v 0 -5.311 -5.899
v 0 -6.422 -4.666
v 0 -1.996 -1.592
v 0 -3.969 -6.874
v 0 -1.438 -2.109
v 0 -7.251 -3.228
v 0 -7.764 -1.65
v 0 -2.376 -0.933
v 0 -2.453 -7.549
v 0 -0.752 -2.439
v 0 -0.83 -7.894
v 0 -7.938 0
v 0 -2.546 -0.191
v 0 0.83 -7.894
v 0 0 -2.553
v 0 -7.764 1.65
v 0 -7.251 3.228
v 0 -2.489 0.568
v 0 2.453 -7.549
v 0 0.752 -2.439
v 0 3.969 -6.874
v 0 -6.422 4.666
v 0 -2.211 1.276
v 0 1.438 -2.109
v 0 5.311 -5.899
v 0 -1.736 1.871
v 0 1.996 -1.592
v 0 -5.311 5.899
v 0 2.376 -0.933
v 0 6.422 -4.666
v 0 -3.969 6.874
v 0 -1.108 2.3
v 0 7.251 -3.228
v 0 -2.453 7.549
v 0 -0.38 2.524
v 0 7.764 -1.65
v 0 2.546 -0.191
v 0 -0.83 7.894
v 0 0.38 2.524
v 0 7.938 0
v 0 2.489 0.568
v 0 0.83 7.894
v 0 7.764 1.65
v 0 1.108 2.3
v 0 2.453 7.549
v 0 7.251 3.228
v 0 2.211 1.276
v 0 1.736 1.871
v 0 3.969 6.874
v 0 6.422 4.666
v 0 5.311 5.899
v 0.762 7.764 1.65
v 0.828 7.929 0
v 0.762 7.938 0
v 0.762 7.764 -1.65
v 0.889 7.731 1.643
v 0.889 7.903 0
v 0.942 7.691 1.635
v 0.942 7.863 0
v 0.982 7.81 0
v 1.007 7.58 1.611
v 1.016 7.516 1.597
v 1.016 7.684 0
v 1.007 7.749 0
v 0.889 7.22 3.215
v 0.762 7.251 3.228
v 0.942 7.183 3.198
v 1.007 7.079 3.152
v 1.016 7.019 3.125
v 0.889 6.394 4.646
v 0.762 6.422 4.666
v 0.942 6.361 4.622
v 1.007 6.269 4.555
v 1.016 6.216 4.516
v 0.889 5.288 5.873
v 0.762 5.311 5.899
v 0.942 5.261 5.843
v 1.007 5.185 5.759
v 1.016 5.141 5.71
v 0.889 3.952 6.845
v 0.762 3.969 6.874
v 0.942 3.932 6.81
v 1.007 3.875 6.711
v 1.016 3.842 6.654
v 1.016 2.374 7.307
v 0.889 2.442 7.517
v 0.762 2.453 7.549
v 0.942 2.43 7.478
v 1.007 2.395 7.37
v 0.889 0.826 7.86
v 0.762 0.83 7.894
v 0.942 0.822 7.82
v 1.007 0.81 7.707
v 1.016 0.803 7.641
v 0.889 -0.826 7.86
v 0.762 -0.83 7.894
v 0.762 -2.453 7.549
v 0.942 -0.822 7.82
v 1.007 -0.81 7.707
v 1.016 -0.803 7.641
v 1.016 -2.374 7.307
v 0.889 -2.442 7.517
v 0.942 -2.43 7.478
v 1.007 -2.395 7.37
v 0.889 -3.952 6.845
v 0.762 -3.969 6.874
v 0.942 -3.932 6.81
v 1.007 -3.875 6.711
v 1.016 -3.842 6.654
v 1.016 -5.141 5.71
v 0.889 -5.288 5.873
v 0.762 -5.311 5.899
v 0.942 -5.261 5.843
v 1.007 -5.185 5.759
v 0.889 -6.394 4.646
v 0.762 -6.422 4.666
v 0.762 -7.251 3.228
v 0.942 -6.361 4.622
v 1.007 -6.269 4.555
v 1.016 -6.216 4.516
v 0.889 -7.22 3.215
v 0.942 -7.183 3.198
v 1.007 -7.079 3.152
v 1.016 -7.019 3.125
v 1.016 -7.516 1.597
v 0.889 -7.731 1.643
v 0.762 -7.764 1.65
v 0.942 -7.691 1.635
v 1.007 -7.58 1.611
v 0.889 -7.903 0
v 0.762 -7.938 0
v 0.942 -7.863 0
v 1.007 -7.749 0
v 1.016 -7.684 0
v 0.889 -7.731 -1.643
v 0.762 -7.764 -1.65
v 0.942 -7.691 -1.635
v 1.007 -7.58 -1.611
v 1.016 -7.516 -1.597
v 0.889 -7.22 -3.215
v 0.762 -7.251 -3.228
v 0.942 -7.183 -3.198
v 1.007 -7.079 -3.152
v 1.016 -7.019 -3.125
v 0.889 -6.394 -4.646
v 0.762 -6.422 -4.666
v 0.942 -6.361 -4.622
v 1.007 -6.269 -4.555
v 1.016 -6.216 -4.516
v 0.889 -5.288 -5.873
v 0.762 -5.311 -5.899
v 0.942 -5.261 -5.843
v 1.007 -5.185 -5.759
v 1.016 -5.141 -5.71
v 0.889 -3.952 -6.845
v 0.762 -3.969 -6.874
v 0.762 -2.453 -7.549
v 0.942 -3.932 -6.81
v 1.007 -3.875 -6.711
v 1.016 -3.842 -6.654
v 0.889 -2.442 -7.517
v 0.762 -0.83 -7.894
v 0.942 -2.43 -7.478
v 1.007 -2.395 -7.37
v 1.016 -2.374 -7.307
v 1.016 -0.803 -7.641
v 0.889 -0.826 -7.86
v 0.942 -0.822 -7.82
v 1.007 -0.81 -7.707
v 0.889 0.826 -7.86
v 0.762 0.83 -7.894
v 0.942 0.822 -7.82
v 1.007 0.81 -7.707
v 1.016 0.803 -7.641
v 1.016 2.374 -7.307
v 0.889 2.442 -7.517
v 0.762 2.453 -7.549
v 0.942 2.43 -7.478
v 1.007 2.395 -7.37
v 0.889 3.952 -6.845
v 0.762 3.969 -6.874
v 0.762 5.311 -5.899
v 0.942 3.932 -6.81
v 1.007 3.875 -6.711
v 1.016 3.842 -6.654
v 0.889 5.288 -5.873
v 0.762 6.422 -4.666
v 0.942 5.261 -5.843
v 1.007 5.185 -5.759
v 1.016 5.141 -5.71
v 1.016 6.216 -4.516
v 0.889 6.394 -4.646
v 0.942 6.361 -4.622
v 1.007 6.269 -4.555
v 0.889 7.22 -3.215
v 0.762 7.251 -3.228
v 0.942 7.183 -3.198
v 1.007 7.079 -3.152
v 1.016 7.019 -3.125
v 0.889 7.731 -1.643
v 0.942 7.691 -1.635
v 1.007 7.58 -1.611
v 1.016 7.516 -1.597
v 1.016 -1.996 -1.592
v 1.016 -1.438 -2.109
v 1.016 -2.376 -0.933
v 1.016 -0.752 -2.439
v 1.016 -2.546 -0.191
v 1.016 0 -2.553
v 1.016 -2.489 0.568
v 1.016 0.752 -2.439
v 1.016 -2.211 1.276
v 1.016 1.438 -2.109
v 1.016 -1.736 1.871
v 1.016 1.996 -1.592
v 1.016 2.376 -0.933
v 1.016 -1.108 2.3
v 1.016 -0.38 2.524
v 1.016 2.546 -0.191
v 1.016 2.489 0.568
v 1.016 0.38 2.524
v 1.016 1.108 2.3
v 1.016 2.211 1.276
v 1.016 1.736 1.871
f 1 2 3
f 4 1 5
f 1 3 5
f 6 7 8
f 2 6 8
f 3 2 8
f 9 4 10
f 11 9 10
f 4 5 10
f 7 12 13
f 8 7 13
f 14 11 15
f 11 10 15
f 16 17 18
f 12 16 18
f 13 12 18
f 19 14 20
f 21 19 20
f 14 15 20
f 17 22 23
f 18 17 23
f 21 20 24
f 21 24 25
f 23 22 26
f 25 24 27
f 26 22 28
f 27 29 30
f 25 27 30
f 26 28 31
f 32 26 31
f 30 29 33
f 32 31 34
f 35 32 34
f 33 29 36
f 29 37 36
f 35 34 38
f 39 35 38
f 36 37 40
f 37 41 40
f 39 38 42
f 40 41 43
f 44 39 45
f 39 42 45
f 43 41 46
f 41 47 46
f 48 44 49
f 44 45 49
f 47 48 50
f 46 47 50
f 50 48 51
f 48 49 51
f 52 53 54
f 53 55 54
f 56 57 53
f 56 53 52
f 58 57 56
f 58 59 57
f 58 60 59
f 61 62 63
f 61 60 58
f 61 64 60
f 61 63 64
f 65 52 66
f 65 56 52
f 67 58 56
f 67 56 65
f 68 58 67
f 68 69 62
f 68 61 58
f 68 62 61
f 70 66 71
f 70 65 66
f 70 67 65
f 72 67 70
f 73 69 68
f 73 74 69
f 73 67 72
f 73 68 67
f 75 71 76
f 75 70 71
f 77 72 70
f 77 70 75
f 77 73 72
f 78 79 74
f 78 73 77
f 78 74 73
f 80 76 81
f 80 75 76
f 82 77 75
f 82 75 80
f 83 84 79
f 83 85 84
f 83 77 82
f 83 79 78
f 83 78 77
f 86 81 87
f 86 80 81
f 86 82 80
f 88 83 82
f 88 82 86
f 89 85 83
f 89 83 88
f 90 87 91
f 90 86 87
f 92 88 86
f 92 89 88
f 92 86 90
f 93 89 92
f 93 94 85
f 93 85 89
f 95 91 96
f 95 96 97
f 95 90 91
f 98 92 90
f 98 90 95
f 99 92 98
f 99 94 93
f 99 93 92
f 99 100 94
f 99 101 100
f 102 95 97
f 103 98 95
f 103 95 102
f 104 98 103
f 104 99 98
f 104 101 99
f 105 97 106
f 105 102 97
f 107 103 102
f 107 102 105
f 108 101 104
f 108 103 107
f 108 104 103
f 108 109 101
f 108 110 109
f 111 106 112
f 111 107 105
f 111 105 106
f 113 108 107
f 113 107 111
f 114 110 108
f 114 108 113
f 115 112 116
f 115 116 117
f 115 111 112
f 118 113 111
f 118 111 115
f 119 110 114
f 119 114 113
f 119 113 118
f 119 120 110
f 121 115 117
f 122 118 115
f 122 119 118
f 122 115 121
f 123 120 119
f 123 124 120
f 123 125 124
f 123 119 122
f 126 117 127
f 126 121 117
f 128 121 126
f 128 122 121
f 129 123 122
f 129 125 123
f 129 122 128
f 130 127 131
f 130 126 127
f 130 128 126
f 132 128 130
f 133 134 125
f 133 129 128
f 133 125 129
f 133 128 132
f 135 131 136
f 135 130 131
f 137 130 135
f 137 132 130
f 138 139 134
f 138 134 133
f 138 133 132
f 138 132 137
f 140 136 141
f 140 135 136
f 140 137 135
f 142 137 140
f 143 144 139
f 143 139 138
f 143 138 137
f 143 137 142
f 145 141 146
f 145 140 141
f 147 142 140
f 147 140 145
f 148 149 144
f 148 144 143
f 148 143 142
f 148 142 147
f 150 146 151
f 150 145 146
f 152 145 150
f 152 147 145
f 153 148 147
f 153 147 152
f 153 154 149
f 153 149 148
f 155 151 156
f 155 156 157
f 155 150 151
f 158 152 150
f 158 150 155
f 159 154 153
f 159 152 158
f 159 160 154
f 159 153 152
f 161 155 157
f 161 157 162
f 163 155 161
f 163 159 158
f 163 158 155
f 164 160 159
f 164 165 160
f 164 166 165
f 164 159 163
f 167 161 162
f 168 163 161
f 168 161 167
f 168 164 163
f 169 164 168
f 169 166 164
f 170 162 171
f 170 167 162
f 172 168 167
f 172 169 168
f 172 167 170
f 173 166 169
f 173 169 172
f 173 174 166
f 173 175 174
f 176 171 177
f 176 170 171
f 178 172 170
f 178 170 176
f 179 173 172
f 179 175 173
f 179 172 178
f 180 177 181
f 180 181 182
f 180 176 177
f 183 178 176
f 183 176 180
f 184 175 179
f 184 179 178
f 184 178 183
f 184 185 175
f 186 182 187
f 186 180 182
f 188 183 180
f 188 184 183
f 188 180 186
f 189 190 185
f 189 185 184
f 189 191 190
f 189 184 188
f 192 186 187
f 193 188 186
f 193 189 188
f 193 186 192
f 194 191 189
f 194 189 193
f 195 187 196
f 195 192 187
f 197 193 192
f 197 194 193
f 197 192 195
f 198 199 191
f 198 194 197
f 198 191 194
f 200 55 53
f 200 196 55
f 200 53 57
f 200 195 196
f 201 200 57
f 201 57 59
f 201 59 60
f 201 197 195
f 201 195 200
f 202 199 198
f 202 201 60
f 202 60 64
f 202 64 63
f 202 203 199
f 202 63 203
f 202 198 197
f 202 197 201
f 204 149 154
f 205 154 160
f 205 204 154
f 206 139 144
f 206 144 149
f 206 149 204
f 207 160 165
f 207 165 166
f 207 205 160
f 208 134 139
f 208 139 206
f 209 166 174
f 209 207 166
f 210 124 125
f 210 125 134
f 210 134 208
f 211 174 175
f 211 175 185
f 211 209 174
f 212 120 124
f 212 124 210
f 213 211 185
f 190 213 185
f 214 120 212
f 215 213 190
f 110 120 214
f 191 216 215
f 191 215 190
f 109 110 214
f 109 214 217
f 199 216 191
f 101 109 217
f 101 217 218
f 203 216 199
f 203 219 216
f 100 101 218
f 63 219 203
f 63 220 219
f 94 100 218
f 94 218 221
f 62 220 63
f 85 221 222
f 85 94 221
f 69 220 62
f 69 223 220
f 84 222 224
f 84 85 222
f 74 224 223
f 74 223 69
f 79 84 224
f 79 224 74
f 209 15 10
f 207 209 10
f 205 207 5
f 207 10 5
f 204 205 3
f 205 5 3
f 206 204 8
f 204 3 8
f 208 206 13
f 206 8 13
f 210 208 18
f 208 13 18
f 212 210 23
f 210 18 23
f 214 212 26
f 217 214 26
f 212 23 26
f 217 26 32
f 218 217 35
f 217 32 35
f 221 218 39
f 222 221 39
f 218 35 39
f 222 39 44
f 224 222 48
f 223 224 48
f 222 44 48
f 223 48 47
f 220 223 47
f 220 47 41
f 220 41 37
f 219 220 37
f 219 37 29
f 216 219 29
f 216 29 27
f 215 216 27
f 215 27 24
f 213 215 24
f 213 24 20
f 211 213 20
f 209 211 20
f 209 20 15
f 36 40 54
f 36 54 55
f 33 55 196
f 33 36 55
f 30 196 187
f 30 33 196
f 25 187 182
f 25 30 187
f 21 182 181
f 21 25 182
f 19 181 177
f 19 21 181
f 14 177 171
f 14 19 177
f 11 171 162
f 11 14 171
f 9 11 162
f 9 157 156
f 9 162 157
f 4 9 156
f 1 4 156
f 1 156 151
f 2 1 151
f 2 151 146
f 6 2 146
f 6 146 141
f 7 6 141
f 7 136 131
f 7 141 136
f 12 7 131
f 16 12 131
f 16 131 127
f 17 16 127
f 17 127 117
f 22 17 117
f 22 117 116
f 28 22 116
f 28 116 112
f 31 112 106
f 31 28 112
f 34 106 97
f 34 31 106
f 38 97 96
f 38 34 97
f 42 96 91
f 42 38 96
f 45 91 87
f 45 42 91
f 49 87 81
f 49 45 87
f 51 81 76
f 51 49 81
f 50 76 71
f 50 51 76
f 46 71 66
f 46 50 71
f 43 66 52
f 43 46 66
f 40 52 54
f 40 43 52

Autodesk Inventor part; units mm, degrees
ref_plane "YZ Plane" through (0, 0, 0) normal (1, 0, 0) x (0, 1, 0)
ref_plane "XZ Plane" through (0, 0, 0) normal (0, 1, 0) x (-1, 0, 0)
ref_plane "XY Plane" through (0, 0, 0) normal (0, 0, 1) x (1, 0, 0)
sketch "Sketch1" plane through (0, 0, 0) normal (1, 0, 0) x (0, 1, 0)
  circle A0 centre (0, 0) radius 7.9375
  dimension "d0" = 15.875
extrude "Extrusion1" add sketch "Sketch1" along normal blind 1.016
sketch "Sketch2" plane through (1.016, 0, 0) normal (1, 0, 0) x (0, 0, -1)
  point P0 (0, 0)
  point P1 (0, 0)
hole "Hole1" at (1.016, 0, 0) direction (-1, 0, 0) diameter 5.1054 end through all clearance for "Flat Head Machine Screw (82)" size "#10" standard "Ansi Unified Screw Threads"
fillet "Fillet1" radius 0.254 1 edges at (1.016, -7.9375, 0)
properties part number "PURCHASED,WASHER" material "Steel, Alloy"
